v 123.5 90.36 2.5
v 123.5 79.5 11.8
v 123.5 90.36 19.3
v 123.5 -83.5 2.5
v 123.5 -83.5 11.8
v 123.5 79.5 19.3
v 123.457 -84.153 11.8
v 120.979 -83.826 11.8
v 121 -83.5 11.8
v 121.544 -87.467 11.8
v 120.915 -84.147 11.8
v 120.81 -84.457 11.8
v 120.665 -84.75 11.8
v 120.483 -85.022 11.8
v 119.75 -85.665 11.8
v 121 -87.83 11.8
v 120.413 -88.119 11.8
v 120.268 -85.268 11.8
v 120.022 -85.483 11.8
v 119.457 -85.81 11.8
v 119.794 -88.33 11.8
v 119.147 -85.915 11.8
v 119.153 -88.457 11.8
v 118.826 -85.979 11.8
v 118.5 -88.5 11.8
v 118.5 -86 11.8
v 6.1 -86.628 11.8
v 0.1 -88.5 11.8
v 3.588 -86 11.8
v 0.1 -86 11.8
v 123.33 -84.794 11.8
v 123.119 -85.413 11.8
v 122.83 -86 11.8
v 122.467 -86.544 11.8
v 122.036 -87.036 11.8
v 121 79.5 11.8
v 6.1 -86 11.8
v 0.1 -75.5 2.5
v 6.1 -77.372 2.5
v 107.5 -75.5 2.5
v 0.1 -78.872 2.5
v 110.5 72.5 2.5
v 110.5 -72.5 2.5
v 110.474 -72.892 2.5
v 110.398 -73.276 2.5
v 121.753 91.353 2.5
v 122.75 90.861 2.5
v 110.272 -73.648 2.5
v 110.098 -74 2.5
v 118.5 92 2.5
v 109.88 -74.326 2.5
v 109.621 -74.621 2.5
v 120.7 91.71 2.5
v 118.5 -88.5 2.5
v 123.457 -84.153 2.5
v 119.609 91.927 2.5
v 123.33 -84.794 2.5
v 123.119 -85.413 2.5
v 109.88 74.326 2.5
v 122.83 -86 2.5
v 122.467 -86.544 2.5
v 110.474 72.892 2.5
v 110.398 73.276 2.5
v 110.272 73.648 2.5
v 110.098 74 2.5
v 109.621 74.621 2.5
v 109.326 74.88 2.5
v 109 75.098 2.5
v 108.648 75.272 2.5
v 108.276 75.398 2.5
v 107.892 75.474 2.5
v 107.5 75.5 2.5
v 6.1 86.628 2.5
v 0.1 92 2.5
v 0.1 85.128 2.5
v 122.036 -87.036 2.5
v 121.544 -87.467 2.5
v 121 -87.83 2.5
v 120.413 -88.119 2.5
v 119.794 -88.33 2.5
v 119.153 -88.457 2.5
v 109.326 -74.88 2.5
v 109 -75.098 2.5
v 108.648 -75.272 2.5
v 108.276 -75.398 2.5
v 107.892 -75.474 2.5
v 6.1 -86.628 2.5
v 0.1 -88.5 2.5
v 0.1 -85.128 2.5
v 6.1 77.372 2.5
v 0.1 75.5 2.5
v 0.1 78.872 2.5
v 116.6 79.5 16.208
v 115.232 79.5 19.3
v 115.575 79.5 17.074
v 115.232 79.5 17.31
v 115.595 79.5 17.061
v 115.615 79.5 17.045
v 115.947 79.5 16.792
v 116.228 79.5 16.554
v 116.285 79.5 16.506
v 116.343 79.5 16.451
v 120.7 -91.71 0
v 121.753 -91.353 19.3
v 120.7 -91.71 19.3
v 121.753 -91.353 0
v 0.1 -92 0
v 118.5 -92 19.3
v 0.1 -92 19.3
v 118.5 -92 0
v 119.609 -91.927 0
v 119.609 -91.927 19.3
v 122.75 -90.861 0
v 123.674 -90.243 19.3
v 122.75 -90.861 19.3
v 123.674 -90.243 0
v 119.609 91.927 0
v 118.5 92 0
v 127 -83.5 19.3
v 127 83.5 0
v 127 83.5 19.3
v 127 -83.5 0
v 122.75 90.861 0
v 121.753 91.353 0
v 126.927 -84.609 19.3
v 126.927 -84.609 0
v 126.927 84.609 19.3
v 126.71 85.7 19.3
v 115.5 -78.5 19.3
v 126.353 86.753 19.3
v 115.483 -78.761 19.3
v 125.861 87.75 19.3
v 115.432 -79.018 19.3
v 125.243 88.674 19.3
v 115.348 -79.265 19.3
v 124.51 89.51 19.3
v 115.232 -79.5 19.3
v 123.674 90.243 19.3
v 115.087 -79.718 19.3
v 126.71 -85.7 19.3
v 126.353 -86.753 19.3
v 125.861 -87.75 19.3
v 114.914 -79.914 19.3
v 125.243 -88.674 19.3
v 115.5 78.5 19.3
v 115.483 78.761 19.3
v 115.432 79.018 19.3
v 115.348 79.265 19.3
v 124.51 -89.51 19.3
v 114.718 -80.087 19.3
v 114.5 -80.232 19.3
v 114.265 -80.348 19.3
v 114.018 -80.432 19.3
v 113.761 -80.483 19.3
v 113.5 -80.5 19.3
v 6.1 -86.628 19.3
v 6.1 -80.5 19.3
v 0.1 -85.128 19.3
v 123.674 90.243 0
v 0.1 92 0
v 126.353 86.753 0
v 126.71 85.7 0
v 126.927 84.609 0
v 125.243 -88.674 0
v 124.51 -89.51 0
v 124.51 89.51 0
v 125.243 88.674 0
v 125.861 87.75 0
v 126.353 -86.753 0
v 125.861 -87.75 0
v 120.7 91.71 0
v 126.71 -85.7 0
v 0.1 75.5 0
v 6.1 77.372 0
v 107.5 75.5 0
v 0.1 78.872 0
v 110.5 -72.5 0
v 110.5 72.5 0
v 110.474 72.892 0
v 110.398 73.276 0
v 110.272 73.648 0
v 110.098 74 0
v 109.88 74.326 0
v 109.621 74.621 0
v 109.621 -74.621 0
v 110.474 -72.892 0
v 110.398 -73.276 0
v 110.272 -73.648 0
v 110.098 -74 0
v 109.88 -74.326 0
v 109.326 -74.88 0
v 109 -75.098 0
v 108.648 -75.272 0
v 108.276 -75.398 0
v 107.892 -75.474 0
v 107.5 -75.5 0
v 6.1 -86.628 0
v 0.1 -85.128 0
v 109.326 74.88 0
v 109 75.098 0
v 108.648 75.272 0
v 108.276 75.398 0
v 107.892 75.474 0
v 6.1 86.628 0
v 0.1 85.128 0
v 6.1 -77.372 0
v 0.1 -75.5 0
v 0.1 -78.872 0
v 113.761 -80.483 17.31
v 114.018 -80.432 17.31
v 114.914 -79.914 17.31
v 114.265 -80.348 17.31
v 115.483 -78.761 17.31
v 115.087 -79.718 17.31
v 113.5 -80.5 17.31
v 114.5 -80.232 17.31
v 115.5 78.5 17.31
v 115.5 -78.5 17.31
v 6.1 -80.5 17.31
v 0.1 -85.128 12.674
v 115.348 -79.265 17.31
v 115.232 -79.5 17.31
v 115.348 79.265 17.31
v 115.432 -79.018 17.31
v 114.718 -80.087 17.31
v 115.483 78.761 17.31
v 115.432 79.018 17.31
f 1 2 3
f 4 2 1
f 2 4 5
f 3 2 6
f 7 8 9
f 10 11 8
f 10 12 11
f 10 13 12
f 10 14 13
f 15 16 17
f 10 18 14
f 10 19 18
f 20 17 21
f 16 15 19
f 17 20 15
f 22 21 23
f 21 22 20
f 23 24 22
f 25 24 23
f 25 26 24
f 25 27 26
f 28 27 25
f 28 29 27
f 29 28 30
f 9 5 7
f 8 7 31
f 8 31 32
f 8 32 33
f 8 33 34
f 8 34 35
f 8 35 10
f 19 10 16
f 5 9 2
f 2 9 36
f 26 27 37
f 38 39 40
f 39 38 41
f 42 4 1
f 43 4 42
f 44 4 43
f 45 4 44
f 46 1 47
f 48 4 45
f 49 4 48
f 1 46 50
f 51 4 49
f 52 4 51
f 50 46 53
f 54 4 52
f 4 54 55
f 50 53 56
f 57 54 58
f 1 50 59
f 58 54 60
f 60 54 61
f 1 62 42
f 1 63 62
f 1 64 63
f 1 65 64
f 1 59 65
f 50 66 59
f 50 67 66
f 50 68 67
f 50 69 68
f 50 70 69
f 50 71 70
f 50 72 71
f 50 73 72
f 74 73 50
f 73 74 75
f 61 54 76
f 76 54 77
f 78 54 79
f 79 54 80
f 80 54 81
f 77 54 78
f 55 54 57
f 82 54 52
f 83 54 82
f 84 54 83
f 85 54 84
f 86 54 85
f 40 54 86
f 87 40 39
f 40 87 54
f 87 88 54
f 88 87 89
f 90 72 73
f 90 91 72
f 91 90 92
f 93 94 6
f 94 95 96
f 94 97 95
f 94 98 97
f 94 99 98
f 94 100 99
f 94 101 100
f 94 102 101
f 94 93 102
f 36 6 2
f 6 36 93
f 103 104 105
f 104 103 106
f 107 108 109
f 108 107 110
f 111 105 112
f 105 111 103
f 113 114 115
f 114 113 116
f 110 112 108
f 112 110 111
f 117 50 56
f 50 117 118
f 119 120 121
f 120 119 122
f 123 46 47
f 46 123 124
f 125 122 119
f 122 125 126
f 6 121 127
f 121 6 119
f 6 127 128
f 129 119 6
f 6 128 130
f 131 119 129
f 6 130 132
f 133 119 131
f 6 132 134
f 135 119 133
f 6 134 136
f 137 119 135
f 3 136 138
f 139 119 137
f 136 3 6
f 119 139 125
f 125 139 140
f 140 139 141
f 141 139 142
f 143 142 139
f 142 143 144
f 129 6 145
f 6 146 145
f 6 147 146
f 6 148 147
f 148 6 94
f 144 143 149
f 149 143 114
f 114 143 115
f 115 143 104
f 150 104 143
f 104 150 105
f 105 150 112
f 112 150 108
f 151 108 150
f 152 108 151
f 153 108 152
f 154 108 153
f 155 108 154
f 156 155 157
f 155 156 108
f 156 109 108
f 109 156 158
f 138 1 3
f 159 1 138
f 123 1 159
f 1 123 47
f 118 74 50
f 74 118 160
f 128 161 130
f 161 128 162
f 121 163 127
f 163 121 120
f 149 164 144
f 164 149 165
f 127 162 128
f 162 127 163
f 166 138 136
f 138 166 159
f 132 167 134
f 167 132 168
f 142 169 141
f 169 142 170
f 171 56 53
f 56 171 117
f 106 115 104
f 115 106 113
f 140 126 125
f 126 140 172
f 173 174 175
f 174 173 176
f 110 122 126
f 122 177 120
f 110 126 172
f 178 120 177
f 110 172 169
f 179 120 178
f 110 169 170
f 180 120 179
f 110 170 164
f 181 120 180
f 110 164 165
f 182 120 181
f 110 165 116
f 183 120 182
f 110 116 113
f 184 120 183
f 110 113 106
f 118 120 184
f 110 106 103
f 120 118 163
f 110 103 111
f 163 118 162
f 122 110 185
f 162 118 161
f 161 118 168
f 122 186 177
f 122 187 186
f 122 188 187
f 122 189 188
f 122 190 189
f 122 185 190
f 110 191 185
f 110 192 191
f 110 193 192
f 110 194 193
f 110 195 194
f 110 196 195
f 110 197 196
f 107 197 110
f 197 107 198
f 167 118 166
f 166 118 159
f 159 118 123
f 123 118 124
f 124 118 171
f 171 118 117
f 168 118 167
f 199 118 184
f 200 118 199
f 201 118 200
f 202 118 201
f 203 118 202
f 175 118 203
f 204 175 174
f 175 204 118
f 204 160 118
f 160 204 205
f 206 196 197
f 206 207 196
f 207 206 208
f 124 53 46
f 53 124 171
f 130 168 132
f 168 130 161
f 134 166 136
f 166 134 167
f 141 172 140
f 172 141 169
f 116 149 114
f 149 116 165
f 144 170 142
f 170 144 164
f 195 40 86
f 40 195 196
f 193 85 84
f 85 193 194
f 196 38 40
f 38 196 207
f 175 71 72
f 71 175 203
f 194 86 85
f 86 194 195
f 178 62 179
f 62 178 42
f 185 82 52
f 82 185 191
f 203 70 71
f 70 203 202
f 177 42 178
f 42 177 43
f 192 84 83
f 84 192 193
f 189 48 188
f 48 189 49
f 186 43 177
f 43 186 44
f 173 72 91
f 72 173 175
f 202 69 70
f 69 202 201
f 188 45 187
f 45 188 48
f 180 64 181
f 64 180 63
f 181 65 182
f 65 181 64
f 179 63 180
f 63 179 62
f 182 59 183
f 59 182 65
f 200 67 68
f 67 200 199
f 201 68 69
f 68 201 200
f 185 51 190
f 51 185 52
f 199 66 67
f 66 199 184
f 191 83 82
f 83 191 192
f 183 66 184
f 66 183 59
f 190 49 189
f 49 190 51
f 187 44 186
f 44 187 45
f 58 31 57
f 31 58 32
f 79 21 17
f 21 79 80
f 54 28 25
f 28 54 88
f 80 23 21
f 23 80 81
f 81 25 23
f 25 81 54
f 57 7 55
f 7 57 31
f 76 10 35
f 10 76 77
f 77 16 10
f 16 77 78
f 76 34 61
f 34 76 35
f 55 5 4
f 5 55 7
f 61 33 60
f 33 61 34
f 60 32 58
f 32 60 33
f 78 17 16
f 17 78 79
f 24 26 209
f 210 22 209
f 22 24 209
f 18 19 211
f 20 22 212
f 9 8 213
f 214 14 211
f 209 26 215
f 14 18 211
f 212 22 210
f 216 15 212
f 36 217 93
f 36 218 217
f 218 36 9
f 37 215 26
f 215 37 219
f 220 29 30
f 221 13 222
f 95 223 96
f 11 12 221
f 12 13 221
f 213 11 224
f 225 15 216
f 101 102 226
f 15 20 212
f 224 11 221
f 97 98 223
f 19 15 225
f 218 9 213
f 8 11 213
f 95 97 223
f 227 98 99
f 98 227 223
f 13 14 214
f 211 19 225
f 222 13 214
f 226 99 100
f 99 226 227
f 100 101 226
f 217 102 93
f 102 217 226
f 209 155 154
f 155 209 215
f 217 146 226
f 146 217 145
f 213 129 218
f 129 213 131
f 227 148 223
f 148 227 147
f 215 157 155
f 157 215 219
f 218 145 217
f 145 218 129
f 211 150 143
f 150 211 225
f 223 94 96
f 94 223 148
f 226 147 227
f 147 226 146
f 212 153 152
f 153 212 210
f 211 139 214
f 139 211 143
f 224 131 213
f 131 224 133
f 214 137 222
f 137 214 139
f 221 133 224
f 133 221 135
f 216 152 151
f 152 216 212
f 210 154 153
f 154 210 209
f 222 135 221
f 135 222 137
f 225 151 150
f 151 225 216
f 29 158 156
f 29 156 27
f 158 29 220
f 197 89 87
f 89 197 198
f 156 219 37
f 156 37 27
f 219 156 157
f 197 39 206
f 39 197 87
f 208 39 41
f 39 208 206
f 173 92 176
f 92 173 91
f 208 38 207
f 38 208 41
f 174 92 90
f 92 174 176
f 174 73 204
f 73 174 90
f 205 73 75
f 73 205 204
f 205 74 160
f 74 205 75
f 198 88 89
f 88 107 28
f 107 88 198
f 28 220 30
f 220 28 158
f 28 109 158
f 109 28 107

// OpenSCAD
// file: surface-go-window-frame.scad
// Slide-in window frame for the Surface Go (1st gen) shop screen.
//
// The flat front face goes against the inside of the window glass, taped all
// the way round (12 mm VHB, e.g. 3M 5952). The tablet slides in from the open
// top edge, between the front lip and the back lip, and rests on the bottom wall.
// The Surface Connect slot is on the tablet's right edge as seen from outside
// (looking at the screen), near the bottom. Seen from the room that is the left wall.
//
// This file renders the landscape frame (open on a long edge).
// surface-go-window-frame-portrait.scad renders the portrait one (open on a
// short edge, charger at the bottom). It reuses the modules here, so change
// dimensions in this file only. The -left/-right and -portrait-top/-bottom
// files render the two halves of each frame for a 256 mm bed.
//
// Anti-rattle: the pocket has 1 mm of front-back play. Stick a strip of 1 mm
// self-adhesive felt along the back of the tablet's two side edges and bottom
// edge (within 6 mm of the edge, where the back rim overlaps it).
//
// Print front face down on the bed (clean, flat face for the tape). No supports:
// the back rim overhangs 2.5 mm flat, then slopes at 45 degrees, and there is
// no rim over the opening. Only the charger slot is bridged (60 mm).
// Strength: 4 walls (perimeters), 30% gyroid infill.
// Units mm. Coordinates as seen from the ROOM (the tablet's back) in landscape: x right,
// y up, z from the glass (0) towards the room.
//
// Licence: CC BY-NC 4.0

/* [Tablet - Surface Go 1 is 245 x 175 x 8.3] */
tab_w = 245.0;
tab_h = 175.0;
tab_t = 8.3;
clear = 1.0;           // per side around the tablet edge
play_t = 1.0;          // front-back play; a 1 mm felt strip takes it up
tab_r = 5.0;           // pocket corner radius (keep <= tablet's corner radius)

/* [Frame] */
wall = 3.5;            // side wall thickness (3.5 keeps the frame inside a 256 mm bed)
lip = 2.5;             // front lip thickness (glass side)
lip_over = 13.0;       // front lip covers the bezel this far (screen starts ~17 in)
back_flat = 2.5;       // back rim: flat overhang (prints without support)
back_over = 8.0;       // back rim: total reach over the tablet's back
back_skin = 2.0;       // back rim thickness above the 45 degree slope

/* [Cutouts - tablet edges as in landscape] */
// (room view: the charger edge is the LEFT wall, the buttons are top RIGHT)
cable_y = [-78, -18];  // Surface Connect slot in the left wall (room view), y range
btn_x = [68, 112];     // power + volume on the top edge (room view), x range

/* [Split for printing - two halves, dovetails + glue] */
dt_neck = 6.0;         // dovetail width at the seam
dt_head = 9.0;         // dovetail width at its tip
dt_len = 6.0;          // how far the dovetail reaches into the other half
dt_fit = 0.2;          // total gap between the halves (all round the dovetail)

$fn = 48;

// --- derived ---------------------------------------------------------------
pw = tab_w + 2 * clear;          // pocket 247 x 177
ph = tab_h + 2 * clear;
ow = pw + 2 * wall;              // outer 254 x 184
oh = ph + 2 * wall;
o_r = tab_r + wall;

z_pocket0 = lip;
z_back = lip + tab_t + play_t;   // tablet back / start of back lip
z_slope = z_back + (back_over - back_flat);
z_top = z_slope + back_skin;

win_w = pw - 2 * lip_over;       // 221 x 151 window (screen ~211 x 141)
win_h = ph - 2 * lip_over;

echo(str("outer ", ow, " x ", oh, " x ", z_top, "  window ", win_w, " x ", win_h,
         "  tape strip ", wall + lip_over));

assert(ow <= 255 && oh <= 255, "frame no longer fits a 256 mm bed");

// --- helpers ---------------------------------------------------------------
module rrect(w, h, r) {
    offset(r = r) square([w - 2 * r, h - 2 * r], center = true);
}

module box(x0, x1, y0, y1, z0, z1) {
    translate([x0, y0, z0]) cube([x1 - x0, y1 - y0, z1 - z0]);
}

module slab(inset, z) {
    translate([0, 0, z]) linear_extrude(0.01)
        rrect(pw - 2 * inset, ph - 2 * inset, max(tab_r - inset, 2));
}

// --- frame -----------------------------------------------------------------
// open = "top"  : landscape, tablet slides down onto its long bottom edge
// open = "right": portrait, opening on the edge opposite the charger (room
//                 view right wall); hung so the charger edge is at the bottom
module frame(open = "top") frame_body(open);

module frame_body(open) {
    big = 50;
    difference() {
        linear_extrude(z_top) rrect(ow, oh, o_r);

        // screen window, all the way through
        translate([0, 0, -1]) linear_extrude(z_top + 2) rrect(win_w, win_h, 3);
        // tablet pocket
        translate([0, 0, z_pocket0]) linear_extrude(z_back - z_pocket0) rrect(pw, ph, tab_r);
        // back opening: flat overhang, then 45 degree slope, then straight up
        hull() {
            slab(back_flat, z_back - 0.01);
            slab(back_over, z_slope);
        }
        translate([0, 0, z_slope - 0.01])
            linear_extrude(z_top) rrect(pw - 2 * back_over, ph - 2 * back_over, 2);

        // the opening: wall removed between the lips, and no back rim on that
        // edge (it would be a full-width bridge; the side rims hold the tablet)
        if (open == "top") {
            box(-pw / 2, pw / 2, 0, big + ph / 2, z_pocket0, z_back);
            box(-pw / 2, pw / 2, ph / 2 - back_over - 1, big + ph / 2, z_back - 0.01, z_top + 1);
        } else {
            box(0, big + pw / 2, -ph / 2, ph / 2, z_pocket0, z_back);
            box(pw / 2 - back_over - 1, big + pw / 2, -ph / 2, ph / 2, z_back - 0.01, z_top + 1);
        }

        // Surface Connect slot (left wall seen from the room = right edge seen from outside)
        box(-ow / 2 - 1, -pw / 2 + 1, cable_y[0], cable_y[1], z_pocket0, z_back);
        // power / volume access (top edge) when the top is closed
        if (open != "top")
            box(btn_x[0], btn_x[1], ph / 2 - 1, oh / 2 + 1, z_pocket0, z_back);
    }
}

// --- split into two halves (seam at x = 0, frame coordinates) --------------
// A 256 mm bed can't really take the 254 mm frame, so each frame also comes as
// two halves. A dovetail on the -x half sits in the middle of the front lip band
// above and below the screen window and locks into the +x half. The lip is the
// face on the bed, so the dovetails print flat; the VHB tape also spans the seam.
dt_y = (win_h / 2 + ph / 2) / 2;   // centre of the lip band
assert(dt_y + dt_head / 2 <= ph / 2 - 1.5, "dovetail too close to the pocket edge");
assert(dt_y - dt_head / 2 >= win_h / 2 + 1.5, "dovetail too close to the screen window");

module minus_x_region() {
    translate([-ow, -oh]) square([ow, 2 * oh]);
    for (s = [1, -1])
        polygon([[-1, s * dt_y - dt_neck / 2], [0, s * dt_y - dt_neck / 2],
                 [dt_len, s * dt_y - dt_head / 2], [dt_len, s * dt_y + dt_head / 2],
                 [0, s * dt_y + dt_neck / 2], [-1, s * dt_y + dt_neck / 2]]);
}

// half = -1 (the -x half, with the dovetails) or 1 (the +x half, with the sockets)
module frame_half(open, half) {
    if (half < 0)
        intersection() {
            frame(open);
            translate([0, 0, -1]) linear_extrude(z_top + 2) offset(delta = -dt_fit / 2) minus_x_region();
        }
    else
        difference() {
            frame(open);
            translate([0, 0, -1]) linear_extrude(z_top + 2) offset(delta = dt_fit / 2) minus_x_region();
        }
}

// Shown as it hangs: portrait is turned so the opening is at the top.
module frame_landscape() frame("top");
module frame_portrait() rotate([0, 0, 90]) frame("right");
module frame_landscape_left()   frame_half("top", -1);
module frame_landscape_right()  frame_half("top", 1);
module frame_portrait_bottom()  rotate([0, 0, 90]) frame_half("right", -1);
module frame_portrait_top()     rotate([0, 0, 90]) frame_half("right", 1);

frame_landscape();
// main file
// Right half of the landscape Surface Go window frame, for a 256 mm bed (Bambu A1/P1/X1).
// Print front face down, no supports. Glue to the other half at the dovetails.
// Dimensions come from surface-go-window-frame.scad.
use <surface-go-window-frame.scad>

frame_landscape_right();
